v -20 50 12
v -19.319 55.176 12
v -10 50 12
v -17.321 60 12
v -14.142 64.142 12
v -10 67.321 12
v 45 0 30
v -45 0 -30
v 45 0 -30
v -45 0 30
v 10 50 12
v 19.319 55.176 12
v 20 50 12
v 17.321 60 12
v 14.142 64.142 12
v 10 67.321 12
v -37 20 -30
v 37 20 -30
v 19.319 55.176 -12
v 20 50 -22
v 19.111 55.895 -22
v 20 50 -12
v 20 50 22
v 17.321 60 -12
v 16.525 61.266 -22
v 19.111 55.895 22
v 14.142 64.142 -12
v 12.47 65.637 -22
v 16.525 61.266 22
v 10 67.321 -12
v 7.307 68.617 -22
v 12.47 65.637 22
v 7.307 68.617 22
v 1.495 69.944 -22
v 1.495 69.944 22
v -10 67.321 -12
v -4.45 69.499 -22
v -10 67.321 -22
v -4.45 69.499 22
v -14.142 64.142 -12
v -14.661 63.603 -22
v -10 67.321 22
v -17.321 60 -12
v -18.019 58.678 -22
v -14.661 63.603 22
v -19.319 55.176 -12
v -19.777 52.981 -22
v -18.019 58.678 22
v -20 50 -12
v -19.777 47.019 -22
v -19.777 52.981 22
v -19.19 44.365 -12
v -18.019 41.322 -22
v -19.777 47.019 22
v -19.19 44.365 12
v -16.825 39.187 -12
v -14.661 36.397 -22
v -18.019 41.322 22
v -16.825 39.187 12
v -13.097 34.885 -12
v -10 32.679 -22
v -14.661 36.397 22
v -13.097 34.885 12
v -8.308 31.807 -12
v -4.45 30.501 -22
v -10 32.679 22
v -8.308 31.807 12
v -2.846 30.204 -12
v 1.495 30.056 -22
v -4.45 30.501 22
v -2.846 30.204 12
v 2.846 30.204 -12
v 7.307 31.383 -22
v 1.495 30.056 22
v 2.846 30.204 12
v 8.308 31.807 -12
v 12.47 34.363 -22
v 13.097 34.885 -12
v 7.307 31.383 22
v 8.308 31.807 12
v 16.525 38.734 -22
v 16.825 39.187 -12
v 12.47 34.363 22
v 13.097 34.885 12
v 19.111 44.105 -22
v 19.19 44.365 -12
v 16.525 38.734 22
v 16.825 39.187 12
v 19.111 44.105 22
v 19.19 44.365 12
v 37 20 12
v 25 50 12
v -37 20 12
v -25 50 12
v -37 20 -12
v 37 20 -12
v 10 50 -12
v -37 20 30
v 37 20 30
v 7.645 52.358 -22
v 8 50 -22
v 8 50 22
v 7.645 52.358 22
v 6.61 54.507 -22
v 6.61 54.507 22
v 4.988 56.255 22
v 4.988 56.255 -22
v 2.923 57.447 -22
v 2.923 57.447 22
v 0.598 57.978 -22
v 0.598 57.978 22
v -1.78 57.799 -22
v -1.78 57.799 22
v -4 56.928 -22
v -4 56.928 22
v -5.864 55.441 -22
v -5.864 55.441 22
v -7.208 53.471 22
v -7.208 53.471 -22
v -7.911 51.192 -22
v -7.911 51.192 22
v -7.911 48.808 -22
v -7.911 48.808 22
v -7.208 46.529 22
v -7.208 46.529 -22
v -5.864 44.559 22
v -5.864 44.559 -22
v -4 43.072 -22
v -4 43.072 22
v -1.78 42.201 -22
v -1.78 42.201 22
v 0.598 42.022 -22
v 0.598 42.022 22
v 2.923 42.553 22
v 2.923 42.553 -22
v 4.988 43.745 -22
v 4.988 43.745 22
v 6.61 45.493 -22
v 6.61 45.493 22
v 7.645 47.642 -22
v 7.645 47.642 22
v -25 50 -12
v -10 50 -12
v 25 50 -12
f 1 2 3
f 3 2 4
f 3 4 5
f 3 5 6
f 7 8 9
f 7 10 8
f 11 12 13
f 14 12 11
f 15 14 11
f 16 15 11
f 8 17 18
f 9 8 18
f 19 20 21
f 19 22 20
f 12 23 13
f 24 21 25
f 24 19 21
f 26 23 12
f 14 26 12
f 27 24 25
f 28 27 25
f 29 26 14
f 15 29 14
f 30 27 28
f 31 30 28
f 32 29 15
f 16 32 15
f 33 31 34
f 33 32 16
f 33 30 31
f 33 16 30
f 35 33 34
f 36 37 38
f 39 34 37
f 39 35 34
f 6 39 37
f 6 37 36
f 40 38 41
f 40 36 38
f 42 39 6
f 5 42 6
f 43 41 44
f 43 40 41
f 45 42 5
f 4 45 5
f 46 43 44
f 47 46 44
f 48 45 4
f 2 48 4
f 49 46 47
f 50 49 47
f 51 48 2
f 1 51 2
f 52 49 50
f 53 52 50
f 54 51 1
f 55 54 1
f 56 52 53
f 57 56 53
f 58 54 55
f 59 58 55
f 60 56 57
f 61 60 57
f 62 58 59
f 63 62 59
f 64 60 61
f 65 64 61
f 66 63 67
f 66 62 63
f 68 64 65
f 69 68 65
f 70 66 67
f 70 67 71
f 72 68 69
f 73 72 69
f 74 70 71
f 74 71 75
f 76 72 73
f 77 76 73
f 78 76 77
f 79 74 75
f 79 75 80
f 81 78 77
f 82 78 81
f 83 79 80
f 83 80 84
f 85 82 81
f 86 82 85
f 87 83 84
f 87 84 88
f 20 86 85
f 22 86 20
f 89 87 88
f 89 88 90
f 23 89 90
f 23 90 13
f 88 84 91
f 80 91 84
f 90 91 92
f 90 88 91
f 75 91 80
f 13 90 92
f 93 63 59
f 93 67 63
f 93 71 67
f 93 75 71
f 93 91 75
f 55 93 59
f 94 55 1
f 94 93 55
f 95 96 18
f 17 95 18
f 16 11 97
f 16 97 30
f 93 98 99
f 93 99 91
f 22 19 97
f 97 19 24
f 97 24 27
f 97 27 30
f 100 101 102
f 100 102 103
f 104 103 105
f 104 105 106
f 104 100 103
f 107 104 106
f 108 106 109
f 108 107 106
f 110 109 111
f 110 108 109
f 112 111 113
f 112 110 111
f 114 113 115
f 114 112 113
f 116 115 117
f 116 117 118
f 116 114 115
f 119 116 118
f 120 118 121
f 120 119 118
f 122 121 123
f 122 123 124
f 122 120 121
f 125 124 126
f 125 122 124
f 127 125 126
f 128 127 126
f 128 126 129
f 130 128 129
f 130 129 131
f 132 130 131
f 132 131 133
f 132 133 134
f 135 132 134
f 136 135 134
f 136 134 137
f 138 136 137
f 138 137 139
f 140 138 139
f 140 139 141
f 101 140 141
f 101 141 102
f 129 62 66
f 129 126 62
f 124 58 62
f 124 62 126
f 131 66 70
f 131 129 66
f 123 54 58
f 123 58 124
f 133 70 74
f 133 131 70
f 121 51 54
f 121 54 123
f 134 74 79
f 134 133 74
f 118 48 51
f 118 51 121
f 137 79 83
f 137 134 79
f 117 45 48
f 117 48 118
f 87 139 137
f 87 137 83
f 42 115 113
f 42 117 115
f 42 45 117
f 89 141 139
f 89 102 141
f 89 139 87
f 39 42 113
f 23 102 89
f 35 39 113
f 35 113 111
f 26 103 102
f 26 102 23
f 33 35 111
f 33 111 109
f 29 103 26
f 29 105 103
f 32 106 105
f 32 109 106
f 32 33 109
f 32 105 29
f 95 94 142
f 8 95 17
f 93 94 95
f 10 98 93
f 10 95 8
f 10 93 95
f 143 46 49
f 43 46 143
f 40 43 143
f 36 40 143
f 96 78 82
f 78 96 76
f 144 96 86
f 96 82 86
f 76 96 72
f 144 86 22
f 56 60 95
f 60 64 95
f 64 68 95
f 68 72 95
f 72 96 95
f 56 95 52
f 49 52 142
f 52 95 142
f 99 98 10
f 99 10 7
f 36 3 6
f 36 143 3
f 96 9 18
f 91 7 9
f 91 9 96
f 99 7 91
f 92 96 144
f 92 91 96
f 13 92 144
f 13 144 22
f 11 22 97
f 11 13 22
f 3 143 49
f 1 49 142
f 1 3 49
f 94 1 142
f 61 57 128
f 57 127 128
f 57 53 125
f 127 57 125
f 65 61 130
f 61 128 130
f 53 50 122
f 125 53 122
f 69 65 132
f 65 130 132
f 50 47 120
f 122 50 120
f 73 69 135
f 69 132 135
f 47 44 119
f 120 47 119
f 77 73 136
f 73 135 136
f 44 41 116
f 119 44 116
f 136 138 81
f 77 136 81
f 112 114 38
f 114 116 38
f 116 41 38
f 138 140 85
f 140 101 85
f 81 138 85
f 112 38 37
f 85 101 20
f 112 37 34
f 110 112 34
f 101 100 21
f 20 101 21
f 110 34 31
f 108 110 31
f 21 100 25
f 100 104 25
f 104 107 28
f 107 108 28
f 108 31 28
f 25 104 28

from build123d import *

# Parameters (mm, degrees)
BOSS_EXTRUDE1_DEPTH     = 30
CUT_EXTRUDE1_DEPTH      = 74.654599313
CUT_EXTRUDE1_DEPTH_BACK = 74.654599313
SKETCH3_W               = 18
SKETCH3_H               = 30
SKETCH4_R               = 20
SKETCH4_R_2             = 8
BOSS_EXTRUDE2_DEPTH     = 22
CUT_EXTRUDE2_DEPTH      = 12
CUT_EXTRUDE3_DEPTH      = 94.214805691
CUT_EXTRUDE3_DEPTH_BACK = 94.214805691
SKETCH6_R               = 8


with BuildPart() as part:
    # Sketch1 → Boss-Extrude1 (new, symmetric)
    with BuildSketch(Plane.XY):
        Polygon((-45, 0), (45, 0), (25, 50), (-25, 50), align=None)
    extrude(amount=BOSS_EXTRUDE1_DEPTH, both=True)

    # Sketch3 → Cut-Extrude1 (cut, two sides: drawn at the far end of the back side and taken through both)
    with BuildSketch(Plane(origin=(0, 0, 0), x_dir=(0, 0, -1), z_dir=(1, 0, 0)).offset(-CUT_EXTRUDE1_DEPTH_BACK)):
        with Locations((21, 35)):
            Rectangle(SKETCH3_W, SKETCH3_H)
        with Locations((-21, 35)):
            Rectangle(SKETCH3_W, SKETCH3_H)
    extrude(amount=CUT_EXTRUDE1_DEPTH + CUT_EXTRUDE1_DEPTH_BACK, mode=Mode.SUBTRACT)

    # Sketch4 → Boss-Extrude2 (add, symmetric)
    with BuildSketch(Plane.XY):
        with Locations((0, 50)):
            Circle(SKETCH4_R)
        with Locations((0, 50)):
            Circle(SKETCH4_R_2, mode=Mode.SUBTRACT)
    extrude(amount=BOSS_EXTRUDE2_DEPTH, both=True)

    # Sketch5 → Cut-Extrude2 (cut, symmetric)
    with BuildSketch(Plane.XY):
        with BuildLine():
            Line((-20, 50), (-10, 50))
            Line((-10, 50), (-10, 67.320508076))
            ThreePointArc((-10, 67.320508076), (-17.320508076, 60), (-20, 50))
        make_face()
        with BuildLine():
            Line((10, 50), (10, 67.320508076))
            ThreePointArc((10, 67.320508076), (17.320508076, 60), (20, 50))
            Line((20, 50), (10, 50))
        make_face()
    extrude(amount=CUT_EXTRUDE2_DEPTH, both=True, mode=Mode.SUBTRACT)

    # Sketch6 → Cut-Extrude3 (cut, two sides: drawn at the far end of the back side and taken through both)
    with BuildSketch(Plane.XY.offset(12).offset(-CUT_EXTRUDE3_DEPTH_BACK)):
        with Locations((0, 50)):
            Circle(SKETCH6_R)
    extrude(amount=CUT_EXTRUDE3_DEPTH + CUT_EXTRUDE3_DEPTH_BACK, mode=Mode.SUBTRACT)


solid = part.part
